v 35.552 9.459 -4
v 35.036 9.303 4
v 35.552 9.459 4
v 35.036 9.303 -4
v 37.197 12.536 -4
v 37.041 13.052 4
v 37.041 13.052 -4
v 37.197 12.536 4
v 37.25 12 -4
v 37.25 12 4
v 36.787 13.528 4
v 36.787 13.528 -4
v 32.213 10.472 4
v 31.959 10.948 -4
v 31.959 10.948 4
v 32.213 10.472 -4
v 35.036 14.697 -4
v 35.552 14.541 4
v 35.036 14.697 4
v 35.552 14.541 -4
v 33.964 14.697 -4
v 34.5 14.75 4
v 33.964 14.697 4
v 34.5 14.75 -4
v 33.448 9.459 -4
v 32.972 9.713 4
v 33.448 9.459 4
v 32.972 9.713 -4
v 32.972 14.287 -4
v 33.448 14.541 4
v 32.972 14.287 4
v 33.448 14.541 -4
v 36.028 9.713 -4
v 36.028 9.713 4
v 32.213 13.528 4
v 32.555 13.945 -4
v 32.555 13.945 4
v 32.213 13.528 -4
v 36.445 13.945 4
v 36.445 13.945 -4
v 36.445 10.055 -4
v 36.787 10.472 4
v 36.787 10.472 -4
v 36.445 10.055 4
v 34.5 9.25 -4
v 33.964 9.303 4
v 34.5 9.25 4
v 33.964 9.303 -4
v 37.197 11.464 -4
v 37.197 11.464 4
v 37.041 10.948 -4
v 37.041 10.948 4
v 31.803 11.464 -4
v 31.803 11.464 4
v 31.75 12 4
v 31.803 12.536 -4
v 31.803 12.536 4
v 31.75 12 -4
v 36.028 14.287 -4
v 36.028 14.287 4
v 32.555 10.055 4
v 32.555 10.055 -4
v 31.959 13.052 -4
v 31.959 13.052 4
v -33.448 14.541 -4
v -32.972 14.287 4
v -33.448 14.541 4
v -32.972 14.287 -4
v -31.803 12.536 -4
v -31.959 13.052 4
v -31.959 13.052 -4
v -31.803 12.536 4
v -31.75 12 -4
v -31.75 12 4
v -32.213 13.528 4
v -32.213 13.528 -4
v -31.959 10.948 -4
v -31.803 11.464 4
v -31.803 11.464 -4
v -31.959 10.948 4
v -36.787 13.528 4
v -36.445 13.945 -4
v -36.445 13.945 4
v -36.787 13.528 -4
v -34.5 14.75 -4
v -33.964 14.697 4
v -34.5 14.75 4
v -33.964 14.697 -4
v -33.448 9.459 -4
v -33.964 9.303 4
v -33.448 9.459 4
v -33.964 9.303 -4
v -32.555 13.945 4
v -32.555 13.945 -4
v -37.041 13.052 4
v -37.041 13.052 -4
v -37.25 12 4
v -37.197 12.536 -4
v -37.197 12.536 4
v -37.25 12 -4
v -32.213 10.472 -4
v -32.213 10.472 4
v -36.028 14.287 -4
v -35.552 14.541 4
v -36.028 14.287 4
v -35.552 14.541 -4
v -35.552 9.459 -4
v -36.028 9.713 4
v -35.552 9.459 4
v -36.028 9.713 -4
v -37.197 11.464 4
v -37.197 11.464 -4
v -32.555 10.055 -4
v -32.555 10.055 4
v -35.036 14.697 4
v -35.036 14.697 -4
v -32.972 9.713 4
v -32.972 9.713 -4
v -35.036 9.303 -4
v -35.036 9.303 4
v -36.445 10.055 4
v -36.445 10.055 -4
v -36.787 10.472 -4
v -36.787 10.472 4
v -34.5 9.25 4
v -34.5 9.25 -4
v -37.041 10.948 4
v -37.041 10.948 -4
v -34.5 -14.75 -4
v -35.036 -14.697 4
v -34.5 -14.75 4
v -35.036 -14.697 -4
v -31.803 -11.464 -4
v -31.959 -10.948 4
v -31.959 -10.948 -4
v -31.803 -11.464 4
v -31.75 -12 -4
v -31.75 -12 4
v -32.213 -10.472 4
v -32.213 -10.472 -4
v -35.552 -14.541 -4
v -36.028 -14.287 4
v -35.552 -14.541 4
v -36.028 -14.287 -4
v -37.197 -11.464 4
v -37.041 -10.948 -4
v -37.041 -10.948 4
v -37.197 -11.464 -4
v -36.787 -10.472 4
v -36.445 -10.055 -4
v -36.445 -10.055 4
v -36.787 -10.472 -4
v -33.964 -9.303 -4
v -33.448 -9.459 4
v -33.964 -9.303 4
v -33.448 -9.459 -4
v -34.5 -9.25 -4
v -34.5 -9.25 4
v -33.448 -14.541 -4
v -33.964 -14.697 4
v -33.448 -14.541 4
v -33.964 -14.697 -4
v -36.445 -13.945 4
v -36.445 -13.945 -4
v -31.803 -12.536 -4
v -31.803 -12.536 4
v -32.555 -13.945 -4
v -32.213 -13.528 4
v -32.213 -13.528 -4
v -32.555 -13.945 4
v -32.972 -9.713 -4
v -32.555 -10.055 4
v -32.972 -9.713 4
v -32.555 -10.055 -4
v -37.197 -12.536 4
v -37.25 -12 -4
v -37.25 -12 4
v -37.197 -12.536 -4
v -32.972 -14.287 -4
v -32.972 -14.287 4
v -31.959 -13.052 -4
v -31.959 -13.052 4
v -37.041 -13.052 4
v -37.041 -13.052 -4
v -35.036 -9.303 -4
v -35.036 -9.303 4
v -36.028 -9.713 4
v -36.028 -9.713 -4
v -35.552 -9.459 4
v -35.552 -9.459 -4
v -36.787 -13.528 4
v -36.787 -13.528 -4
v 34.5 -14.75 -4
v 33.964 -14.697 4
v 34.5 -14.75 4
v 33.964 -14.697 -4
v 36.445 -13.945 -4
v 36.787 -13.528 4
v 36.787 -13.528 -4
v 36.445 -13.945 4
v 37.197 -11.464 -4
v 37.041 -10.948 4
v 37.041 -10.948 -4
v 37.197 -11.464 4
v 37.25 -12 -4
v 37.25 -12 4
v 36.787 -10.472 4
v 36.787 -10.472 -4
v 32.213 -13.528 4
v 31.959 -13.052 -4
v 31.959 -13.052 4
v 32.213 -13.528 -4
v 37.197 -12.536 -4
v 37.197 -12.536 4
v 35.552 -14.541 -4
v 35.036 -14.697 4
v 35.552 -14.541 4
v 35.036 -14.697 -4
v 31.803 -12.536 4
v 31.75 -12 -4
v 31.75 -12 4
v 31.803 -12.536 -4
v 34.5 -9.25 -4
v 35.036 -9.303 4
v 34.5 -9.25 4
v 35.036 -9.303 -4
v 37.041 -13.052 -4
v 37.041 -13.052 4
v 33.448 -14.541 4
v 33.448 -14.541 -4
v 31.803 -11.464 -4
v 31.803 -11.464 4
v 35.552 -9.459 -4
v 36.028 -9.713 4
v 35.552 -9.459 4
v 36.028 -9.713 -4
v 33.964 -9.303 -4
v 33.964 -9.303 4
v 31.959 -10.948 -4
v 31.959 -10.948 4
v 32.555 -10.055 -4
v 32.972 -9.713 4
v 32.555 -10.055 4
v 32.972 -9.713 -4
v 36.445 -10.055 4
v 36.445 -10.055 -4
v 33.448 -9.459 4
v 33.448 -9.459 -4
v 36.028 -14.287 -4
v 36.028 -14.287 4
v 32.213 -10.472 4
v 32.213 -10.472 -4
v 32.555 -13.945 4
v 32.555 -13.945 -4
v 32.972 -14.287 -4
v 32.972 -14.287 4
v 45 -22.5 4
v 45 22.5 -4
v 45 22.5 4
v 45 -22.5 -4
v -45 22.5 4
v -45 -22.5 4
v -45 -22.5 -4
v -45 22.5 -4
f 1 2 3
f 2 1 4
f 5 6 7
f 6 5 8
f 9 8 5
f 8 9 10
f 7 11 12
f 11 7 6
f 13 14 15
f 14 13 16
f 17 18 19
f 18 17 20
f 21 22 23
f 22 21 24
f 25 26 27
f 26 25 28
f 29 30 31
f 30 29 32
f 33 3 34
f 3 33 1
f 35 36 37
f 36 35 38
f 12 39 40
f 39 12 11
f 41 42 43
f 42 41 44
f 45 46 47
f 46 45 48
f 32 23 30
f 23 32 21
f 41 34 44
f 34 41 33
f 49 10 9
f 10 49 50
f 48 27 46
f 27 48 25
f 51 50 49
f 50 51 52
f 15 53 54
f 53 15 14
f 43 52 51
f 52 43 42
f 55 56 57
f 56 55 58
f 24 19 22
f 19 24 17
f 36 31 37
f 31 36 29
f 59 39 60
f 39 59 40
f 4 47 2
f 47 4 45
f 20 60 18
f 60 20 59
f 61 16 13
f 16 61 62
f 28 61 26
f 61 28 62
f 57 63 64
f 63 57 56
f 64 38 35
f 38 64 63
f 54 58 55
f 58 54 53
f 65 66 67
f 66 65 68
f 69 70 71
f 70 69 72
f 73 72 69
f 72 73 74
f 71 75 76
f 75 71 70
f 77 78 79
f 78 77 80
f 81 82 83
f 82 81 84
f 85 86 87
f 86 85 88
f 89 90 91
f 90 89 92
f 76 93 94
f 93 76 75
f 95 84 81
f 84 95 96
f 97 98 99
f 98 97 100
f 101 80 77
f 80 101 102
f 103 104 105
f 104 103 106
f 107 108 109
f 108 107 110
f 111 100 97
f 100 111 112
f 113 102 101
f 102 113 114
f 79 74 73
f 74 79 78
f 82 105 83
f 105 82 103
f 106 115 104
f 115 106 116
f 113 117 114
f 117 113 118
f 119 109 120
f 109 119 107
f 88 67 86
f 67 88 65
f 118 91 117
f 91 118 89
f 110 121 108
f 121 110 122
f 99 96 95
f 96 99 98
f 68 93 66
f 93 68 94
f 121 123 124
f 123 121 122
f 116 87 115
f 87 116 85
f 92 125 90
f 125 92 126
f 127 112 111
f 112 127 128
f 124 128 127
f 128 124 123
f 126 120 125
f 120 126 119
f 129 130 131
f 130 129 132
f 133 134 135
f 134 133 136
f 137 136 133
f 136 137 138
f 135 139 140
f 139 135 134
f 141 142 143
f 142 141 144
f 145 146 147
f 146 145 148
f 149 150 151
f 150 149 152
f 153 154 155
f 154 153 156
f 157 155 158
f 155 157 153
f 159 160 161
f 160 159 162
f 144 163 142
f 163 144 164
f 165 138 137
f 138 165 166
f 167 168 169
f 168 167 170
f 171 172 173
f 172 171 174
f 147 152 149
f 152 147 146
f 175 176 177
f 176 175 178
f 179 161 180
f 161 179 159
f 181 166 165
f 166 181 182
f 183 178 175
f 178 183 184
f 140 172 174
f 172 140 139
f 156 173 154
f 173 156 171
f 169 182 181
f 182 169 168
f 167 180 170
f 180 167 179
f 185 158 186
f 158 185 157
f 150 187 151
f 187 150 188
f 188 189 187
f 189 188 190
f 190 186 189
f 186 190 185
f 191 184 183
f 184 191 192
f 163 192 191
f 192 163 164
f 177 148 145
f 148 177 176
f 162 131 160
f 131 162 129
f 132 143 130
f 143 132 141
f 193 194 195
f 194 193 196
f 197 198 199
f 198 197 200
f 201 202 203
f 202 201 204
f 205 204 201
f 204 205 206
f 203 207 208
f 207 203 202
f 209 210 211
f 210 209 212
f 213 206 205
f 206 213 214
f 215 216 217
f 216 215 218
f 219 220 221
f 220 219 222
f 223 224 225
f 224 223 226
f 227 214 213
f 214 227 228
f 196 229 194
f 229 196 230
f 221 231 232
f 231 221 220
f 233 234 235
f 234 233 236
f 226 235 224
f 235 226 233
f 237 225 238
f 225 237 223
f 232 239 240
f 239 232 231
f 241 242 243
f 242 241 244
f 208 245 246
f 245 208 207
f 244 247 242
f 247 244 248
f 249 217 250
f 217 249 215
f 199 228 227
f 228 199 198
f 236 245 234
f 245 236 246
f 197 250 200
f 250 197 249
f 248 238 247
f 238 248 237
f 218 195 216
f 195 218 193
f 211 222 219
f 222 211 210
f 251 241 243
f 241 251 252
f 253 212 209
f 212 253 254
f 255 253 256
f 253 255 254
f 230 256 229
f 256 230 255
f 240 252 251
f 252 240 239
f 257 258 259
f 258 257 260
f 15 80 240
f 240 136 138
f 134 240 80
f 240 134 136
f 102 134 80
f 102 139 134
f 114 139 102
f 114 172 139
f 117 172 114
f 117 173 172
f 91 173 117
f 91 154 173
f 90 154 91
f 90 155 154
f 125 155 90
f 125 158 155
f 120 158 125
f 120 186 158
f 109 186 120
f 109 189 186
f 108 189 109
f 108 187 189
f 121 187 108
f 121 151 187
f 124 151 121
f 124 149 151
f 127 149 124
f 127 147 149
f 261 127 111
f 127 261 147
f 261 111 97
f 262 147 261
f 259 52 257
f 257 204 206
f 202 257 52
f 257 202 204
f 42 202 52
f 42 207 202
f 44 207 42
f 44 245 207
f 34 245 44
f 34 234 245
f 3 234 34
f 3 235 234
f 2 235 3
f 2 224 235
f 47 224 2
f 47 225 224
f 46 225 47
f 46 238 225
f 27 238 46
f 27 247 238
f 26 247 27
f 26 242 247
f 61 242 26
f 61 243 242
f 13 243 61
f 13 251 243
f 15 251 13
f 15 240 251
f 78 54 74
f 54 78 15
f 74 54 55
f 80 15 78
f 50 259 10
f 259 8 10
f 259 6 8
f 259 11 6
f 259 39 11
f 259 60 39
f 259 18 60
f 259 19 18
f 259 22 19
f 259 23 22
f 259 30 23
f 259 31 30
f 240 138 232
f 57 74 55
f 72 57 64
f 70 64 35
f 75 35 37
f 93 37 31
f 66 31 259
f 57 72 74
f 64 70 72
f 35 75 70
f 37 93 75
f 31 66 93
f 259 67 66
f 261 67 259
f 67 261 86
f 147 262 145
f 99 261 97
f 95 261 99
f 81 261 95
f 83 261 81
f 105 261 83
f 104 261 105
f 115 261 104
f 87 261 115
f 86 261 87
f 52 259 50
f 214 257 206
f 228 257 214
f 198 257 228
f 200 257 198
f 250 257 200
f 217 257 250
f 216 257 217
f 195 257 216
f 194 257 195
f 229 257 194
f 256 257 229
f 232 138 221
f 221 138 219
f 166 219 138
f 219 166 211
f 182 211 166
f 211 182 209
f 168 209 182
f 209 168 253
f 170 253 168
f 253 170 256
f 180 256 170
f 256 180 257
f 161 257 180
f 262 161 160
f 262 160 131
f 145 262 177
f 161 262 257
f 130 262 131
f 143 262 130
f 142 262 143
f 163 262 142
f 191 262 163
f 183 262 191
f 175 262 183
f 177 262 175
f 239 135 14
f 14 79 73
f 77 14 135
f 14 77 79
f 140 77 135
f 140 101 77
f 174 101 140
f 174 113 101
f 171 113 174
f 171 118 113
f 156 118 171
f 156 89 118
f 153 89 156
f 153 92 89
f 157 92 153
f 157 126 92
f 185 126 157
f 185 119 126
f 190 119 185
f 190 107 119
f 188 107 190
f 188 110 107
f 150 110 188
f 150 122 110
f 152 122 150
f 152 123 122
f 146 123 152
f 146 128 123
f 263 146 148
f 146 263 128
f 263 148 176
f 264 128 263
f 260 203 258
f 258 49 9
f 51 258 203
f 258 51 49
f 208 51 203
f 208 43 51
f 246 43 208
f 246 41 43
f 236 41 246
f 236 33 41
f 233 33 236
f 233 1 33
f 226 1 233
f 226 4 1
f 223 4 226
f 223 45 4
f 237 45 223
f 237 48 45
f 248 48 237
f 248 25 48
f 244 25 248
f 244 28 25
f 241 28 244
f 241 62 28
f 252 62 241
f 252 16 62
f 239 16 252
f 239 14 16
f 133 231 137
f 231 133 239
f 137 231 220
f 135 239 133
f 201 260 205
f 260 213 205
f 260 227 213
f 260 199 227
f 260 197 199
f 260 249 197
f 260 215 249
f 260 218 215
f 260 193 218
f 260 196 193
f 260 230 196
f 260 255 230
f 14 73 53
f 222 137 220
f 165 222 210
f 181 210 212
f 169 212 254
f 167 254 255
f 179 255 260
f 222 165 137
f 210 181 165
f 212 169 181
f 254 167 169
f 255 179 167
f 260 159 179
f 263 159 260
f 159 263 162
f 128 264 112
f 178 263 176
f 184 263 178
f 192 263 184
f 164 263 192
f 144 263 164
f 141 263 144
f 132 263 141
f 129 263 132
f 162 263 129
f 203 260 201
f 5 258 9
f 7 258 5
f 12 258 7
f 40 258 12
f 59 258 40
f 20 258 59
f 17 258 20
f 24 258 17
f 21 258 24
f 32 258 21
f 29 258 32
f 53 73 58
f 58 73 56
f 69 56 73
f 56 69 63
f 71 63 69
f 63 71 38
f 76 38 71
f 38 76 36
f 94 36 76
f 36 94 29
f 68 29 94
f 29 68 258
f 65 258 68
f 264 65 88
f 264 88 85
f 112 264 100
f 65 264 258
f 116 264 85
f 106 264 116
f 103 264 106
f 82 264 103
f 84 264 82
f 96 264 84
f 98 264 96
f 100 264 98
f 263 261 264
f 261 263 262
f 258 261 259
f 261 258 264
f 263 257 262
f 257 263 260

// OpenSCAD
$fn = 32;

// ----------------------------------------------------------------------
// Corner plate 90 x 45 x 8
// 4 holes, centres taken from the edge offset
// ----------------------------------------------------------------------

// --- parameters (mm) ---
plate = [90, 45, 8];  // overall size (x, y, z)
holes = 4;            // number of holes the drawing asks for
hole_d = 5.5;         // hole diameter
edge = 10.5;          // hole centre offset from the plate edge

// --- derived feature positions (mm) ---
corner_x = plate[0] / 2 - edge;  // = 34.5   corner hole X
corner_y = plate[1] / 2 - edge;  // = 12   corner hole Y
feature_centers = [
  [corner_x, corner_y],
  [-corner_x, corner_y],
  [-corner_x, -corner_y],
  [corner_x, -corner_y]
];   // hole centres the loop below drills

// plate outline, every hole drilled through with the same cutters
difference() {
  cube(plate, center = true);
  for (centre = feature_centers)
    translate([centre[0], centre[1], 0])
      cylinder(d = hole_d, h = plate[2] + 2, center = true);
}
